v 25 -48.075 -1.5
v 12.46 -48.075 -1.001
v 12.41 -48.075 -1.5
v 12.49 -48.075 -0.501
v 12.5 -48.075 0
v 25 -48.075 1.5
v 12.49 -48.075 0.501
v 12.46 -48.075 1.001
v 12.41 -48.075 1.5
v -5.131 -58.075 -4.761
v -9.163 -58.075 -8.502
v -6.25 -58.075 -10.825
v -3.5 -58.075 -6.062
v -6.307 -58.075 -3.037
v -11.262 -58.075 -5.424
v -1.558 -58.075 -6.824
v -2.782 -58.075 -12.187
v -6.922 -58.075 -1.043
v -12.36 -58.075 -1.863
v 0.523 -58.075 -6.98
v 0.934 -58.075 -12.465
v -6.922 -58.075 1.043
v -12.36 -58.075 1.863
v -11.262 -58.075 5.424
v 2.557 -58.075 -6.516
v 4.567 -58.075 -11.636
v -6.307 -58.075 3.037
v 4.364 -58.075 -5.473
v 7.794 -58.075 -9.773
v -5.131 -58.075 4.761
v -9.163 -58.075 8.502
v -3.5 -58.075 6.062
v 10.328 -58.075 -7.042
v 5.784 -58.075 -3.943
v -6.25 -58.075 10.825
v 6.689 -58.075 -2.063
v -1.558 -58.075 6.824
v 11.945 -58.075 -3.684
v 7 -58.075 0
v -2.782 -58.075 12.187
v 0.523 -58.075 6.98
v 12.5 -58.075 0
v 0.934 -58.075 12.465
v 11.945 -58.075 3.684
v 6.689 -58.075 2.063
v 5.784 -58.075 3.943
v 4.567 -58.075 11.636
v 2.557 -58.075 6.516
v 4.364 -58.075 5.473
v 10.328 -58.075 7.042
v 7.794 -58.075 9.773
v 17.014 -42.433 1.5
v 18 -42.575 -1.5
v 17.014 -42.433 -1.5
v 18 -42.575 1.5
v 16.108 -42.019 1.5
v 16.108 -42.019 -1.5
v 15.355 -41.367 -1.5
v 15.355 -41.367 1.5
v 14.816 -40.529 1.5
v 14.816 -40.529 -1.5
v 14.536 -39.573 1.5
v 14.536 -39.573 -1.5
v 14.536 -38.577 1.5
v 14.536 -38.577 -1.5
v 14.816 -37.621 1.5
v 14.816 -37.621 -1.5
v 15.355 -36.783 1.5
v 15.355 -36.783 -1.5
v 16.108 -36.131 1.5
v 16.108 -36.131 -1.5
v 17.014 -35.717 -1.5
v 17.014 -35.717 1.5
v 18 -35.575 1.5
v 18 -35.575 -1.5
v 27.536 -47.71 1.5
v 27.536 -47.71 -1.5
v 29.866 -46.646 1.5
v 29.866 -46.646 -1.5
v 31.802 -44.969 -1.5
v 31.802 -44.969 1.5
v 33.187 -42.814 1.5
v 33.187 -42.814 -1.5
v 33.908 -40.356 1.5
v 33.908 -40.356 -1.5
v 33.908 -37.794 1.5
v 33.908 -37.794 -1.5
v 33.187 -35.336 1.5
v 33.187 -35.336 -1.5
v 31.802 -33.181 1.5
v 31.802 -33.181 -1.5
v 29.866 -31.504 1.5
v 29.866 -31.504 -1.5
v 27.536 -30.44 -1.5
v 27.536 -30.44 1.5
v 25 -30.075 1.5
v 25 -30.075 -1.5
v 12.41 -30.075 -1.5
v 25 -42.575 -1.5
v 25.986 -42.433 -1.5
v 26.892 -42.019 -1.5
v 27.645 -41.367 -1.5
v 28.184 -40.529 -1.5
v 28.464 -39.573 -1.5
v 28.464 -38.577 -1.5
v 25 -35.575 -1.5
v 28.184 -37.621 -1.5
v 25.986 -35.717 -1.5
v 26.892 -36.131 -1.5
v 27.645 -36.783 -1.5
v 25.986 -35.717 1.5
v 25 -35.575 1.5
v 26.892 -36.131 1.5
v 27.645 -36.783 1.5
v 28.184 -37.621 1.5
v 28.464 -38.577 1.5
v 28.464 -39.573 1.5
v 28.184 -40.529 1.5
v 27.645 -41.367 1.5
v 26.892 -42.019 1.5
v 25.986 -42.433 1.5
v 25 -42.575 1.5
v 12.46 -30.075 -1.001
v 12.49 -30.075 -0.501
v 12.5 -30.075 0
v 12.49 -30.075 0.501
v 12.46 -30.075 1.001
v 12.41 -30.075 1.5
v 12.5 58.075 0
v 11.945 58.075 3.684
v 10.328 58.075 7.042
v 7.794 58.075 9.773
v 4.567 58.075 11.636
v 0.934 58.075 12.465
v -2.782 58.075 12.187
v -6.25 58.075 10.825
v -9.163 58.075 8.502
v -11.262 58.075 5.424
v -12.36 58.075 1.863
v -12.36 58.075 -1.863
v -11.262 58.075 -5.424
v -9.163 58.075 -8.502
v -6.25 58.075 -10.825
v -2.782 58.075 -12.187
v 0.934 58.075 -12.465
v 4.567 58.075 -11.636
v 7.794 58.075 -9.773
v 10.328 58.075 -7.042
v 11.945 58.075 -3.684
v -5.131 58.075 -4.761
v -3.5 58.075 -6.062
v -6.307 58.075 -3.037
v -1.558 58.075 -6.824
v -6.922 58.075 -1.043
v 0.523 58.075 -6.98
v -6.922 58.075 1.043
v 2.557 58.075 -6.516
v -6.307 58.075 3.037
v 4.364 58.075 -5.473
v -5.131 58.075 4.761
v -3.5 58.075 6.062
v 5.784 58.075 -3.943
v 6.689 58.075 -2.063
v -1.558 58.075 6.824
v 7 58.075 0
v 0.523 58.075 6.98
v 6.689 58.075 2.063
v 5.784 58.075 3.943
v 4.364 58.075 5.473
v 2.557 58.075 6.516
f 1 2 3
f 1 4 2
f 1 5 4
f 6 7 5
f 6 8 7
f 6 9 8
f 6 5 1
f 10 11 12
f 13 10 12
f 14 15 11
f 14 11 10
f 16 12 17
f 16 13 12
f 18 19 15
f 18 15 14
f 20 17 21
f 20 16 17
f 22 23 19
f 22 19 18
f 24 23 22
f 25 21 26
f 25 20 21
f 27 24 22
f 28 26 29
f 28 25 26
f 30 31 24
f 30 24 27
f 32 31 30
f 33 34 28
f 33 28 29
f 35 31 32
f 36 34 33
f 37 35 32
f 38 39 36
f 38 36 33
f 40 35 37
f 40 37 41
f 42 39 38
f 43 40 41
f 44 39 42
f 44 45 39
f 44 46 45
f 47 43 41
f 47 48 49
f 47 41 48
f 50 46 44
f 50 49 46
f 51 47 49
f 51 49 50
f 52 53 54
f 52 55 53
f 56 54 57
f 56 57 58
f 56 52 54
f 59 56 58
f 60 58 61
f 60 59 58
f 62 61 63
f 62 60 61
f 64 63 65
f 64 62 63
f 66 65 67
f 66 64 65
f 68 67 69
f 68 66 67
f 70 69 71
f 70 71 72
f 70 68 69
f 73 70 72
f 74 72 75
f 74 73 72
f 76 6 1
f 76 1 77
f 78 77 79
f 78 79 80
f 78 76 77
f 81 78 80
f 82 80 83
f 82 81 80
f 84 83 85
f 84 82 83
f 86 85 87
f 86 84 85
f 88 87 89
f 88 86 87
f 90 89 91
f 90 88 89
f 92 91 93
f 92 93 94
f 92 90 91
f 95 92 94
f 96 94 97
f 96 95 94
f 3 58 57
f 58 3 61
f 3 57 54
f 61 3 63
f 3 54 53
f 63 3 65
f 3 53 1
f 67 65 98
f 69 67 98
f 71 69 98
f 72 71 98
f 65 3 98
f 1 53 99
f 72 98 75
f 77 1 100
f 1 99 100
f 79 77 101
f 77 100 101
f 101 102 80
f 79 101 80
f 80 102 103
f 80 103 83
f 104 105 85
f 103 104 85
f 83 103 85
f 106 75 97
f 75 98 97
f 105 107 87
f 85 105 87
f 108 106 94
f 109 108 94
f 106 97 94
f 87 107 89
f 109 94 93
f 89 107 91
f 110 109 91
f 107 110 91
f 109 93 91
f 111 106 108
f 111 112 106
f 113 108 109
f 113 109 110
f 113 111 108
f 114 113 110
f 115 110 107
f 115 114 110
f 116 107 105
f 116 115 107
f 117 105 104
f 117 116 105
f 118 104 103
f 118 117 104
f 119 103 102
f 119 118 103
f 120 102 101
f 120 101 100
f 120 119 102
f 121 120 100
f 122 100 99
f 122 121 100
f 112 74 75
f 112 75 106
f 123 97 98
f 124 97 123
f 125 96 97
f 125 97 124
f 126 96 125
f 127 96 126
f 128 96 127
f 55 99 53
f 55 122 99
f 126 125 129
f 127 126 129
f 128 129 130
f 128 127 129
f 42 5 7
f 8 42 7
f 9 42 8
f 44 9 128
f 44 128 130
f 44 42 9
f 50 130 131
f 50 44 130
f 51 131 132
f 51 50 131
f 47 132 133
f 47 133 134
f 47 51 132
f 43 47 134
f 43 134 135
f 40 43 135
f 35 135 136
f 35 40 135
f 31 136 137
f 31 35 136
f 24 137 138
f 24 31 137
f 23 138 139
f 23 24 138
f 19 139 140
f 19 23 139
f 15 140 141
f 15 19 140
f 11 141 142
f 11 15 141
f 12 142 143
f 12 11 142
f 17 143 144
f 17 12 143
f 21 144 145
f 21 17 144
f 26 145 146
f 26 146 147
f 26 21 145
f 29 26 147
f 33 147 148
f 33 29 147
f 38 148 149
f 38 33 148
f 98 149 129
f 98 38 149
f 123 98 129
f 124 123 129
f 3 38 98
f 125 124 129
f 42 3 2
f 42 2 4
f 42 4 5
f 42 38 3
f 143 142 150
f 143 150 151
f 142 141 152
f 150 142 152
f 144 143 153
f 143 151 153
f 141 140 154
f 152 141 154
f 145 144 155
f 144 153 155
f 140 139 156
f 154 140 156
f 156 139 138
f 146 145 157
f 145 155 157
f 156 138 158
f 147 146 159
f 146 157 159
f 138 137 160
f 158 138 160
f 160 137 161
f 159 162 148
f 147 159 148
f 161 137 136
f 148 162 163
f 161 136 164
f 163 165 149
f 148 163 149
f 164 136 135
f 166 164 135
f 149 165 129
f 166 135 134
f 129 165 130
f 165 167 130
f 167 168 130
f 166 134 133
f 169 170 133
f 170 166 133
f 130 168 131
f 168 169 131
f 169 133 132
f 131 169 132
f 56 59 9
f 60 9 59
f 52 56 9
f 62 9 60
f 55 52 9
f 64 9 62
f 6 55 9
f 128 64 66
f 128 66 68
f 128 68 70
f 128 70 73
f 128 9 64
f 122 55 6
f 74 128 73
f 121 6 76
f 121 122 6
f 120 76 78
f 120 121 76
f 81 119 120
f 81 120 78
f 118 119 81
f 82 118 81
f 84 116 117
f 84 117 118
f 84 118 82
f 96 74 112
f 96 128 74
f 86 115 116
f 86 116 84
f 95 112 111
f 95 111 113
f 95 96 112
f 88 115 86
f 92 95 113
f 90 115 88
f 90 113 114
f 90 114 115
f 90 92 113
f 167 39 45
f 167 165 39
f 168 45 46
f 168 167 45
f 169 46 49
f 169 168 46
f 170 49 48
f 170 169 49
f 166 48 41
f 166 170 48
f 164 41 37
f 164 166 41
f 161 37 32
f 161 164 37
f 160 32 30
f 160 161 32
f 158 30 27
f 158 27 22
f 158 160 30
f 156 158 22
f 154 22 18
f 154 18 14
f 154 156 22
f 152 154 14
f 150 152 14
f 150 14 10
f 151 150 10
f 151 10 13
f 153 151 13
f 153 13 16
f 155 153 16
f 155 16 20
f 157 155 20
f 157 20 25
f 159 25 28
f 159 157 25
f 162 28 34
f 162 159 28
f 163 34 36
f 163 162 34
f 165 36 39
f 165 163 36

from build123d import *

# Parameters (mm, degrees)
F0_R     = 12.5
F0_R_2   = 7
F1_DEPTH = 58.075
F3_DEPTH = 1.5


with BuildPart() as f1:
    # F0 (on Front) → F1 (new body, symmetric)
    with BuildSketch(Plane.XZ):
        Circle(F0_R)
        Circle(F0_R_2, mode=Mode.SUBTRACT)
    extrude(amount=F1_DEPTH, both=True)

    # F2 (on Top) → F3 (join, symmetric)
    with BuildSketch(Plane.XY):
        with BuildLine():
            Line((10, -30.075), (10, -48.075))
            Line((10, -48.075), (25, -48.075))
            ThreePointArc((25, -48.075), (34, -39.075), (25, -30.075))
            Line((25, -30.075), (10, -30.075))
        make_face()
        with BuildLine():
            Line((18, -35.575), (25, -35.575))
            ThreePointArc((25, -35.575), (28.5, -39.075), (25, -42.575))
            Line((25, -42.575), (18, -42.575))
            ThreePointArc((18, -42.575), (14.5, -39.075), (18, -35.575))
        make_face(mode=Mode.SUBTRACT)
    extrude(amount=F3_DEPTH, both=True)


solid = f1.part
